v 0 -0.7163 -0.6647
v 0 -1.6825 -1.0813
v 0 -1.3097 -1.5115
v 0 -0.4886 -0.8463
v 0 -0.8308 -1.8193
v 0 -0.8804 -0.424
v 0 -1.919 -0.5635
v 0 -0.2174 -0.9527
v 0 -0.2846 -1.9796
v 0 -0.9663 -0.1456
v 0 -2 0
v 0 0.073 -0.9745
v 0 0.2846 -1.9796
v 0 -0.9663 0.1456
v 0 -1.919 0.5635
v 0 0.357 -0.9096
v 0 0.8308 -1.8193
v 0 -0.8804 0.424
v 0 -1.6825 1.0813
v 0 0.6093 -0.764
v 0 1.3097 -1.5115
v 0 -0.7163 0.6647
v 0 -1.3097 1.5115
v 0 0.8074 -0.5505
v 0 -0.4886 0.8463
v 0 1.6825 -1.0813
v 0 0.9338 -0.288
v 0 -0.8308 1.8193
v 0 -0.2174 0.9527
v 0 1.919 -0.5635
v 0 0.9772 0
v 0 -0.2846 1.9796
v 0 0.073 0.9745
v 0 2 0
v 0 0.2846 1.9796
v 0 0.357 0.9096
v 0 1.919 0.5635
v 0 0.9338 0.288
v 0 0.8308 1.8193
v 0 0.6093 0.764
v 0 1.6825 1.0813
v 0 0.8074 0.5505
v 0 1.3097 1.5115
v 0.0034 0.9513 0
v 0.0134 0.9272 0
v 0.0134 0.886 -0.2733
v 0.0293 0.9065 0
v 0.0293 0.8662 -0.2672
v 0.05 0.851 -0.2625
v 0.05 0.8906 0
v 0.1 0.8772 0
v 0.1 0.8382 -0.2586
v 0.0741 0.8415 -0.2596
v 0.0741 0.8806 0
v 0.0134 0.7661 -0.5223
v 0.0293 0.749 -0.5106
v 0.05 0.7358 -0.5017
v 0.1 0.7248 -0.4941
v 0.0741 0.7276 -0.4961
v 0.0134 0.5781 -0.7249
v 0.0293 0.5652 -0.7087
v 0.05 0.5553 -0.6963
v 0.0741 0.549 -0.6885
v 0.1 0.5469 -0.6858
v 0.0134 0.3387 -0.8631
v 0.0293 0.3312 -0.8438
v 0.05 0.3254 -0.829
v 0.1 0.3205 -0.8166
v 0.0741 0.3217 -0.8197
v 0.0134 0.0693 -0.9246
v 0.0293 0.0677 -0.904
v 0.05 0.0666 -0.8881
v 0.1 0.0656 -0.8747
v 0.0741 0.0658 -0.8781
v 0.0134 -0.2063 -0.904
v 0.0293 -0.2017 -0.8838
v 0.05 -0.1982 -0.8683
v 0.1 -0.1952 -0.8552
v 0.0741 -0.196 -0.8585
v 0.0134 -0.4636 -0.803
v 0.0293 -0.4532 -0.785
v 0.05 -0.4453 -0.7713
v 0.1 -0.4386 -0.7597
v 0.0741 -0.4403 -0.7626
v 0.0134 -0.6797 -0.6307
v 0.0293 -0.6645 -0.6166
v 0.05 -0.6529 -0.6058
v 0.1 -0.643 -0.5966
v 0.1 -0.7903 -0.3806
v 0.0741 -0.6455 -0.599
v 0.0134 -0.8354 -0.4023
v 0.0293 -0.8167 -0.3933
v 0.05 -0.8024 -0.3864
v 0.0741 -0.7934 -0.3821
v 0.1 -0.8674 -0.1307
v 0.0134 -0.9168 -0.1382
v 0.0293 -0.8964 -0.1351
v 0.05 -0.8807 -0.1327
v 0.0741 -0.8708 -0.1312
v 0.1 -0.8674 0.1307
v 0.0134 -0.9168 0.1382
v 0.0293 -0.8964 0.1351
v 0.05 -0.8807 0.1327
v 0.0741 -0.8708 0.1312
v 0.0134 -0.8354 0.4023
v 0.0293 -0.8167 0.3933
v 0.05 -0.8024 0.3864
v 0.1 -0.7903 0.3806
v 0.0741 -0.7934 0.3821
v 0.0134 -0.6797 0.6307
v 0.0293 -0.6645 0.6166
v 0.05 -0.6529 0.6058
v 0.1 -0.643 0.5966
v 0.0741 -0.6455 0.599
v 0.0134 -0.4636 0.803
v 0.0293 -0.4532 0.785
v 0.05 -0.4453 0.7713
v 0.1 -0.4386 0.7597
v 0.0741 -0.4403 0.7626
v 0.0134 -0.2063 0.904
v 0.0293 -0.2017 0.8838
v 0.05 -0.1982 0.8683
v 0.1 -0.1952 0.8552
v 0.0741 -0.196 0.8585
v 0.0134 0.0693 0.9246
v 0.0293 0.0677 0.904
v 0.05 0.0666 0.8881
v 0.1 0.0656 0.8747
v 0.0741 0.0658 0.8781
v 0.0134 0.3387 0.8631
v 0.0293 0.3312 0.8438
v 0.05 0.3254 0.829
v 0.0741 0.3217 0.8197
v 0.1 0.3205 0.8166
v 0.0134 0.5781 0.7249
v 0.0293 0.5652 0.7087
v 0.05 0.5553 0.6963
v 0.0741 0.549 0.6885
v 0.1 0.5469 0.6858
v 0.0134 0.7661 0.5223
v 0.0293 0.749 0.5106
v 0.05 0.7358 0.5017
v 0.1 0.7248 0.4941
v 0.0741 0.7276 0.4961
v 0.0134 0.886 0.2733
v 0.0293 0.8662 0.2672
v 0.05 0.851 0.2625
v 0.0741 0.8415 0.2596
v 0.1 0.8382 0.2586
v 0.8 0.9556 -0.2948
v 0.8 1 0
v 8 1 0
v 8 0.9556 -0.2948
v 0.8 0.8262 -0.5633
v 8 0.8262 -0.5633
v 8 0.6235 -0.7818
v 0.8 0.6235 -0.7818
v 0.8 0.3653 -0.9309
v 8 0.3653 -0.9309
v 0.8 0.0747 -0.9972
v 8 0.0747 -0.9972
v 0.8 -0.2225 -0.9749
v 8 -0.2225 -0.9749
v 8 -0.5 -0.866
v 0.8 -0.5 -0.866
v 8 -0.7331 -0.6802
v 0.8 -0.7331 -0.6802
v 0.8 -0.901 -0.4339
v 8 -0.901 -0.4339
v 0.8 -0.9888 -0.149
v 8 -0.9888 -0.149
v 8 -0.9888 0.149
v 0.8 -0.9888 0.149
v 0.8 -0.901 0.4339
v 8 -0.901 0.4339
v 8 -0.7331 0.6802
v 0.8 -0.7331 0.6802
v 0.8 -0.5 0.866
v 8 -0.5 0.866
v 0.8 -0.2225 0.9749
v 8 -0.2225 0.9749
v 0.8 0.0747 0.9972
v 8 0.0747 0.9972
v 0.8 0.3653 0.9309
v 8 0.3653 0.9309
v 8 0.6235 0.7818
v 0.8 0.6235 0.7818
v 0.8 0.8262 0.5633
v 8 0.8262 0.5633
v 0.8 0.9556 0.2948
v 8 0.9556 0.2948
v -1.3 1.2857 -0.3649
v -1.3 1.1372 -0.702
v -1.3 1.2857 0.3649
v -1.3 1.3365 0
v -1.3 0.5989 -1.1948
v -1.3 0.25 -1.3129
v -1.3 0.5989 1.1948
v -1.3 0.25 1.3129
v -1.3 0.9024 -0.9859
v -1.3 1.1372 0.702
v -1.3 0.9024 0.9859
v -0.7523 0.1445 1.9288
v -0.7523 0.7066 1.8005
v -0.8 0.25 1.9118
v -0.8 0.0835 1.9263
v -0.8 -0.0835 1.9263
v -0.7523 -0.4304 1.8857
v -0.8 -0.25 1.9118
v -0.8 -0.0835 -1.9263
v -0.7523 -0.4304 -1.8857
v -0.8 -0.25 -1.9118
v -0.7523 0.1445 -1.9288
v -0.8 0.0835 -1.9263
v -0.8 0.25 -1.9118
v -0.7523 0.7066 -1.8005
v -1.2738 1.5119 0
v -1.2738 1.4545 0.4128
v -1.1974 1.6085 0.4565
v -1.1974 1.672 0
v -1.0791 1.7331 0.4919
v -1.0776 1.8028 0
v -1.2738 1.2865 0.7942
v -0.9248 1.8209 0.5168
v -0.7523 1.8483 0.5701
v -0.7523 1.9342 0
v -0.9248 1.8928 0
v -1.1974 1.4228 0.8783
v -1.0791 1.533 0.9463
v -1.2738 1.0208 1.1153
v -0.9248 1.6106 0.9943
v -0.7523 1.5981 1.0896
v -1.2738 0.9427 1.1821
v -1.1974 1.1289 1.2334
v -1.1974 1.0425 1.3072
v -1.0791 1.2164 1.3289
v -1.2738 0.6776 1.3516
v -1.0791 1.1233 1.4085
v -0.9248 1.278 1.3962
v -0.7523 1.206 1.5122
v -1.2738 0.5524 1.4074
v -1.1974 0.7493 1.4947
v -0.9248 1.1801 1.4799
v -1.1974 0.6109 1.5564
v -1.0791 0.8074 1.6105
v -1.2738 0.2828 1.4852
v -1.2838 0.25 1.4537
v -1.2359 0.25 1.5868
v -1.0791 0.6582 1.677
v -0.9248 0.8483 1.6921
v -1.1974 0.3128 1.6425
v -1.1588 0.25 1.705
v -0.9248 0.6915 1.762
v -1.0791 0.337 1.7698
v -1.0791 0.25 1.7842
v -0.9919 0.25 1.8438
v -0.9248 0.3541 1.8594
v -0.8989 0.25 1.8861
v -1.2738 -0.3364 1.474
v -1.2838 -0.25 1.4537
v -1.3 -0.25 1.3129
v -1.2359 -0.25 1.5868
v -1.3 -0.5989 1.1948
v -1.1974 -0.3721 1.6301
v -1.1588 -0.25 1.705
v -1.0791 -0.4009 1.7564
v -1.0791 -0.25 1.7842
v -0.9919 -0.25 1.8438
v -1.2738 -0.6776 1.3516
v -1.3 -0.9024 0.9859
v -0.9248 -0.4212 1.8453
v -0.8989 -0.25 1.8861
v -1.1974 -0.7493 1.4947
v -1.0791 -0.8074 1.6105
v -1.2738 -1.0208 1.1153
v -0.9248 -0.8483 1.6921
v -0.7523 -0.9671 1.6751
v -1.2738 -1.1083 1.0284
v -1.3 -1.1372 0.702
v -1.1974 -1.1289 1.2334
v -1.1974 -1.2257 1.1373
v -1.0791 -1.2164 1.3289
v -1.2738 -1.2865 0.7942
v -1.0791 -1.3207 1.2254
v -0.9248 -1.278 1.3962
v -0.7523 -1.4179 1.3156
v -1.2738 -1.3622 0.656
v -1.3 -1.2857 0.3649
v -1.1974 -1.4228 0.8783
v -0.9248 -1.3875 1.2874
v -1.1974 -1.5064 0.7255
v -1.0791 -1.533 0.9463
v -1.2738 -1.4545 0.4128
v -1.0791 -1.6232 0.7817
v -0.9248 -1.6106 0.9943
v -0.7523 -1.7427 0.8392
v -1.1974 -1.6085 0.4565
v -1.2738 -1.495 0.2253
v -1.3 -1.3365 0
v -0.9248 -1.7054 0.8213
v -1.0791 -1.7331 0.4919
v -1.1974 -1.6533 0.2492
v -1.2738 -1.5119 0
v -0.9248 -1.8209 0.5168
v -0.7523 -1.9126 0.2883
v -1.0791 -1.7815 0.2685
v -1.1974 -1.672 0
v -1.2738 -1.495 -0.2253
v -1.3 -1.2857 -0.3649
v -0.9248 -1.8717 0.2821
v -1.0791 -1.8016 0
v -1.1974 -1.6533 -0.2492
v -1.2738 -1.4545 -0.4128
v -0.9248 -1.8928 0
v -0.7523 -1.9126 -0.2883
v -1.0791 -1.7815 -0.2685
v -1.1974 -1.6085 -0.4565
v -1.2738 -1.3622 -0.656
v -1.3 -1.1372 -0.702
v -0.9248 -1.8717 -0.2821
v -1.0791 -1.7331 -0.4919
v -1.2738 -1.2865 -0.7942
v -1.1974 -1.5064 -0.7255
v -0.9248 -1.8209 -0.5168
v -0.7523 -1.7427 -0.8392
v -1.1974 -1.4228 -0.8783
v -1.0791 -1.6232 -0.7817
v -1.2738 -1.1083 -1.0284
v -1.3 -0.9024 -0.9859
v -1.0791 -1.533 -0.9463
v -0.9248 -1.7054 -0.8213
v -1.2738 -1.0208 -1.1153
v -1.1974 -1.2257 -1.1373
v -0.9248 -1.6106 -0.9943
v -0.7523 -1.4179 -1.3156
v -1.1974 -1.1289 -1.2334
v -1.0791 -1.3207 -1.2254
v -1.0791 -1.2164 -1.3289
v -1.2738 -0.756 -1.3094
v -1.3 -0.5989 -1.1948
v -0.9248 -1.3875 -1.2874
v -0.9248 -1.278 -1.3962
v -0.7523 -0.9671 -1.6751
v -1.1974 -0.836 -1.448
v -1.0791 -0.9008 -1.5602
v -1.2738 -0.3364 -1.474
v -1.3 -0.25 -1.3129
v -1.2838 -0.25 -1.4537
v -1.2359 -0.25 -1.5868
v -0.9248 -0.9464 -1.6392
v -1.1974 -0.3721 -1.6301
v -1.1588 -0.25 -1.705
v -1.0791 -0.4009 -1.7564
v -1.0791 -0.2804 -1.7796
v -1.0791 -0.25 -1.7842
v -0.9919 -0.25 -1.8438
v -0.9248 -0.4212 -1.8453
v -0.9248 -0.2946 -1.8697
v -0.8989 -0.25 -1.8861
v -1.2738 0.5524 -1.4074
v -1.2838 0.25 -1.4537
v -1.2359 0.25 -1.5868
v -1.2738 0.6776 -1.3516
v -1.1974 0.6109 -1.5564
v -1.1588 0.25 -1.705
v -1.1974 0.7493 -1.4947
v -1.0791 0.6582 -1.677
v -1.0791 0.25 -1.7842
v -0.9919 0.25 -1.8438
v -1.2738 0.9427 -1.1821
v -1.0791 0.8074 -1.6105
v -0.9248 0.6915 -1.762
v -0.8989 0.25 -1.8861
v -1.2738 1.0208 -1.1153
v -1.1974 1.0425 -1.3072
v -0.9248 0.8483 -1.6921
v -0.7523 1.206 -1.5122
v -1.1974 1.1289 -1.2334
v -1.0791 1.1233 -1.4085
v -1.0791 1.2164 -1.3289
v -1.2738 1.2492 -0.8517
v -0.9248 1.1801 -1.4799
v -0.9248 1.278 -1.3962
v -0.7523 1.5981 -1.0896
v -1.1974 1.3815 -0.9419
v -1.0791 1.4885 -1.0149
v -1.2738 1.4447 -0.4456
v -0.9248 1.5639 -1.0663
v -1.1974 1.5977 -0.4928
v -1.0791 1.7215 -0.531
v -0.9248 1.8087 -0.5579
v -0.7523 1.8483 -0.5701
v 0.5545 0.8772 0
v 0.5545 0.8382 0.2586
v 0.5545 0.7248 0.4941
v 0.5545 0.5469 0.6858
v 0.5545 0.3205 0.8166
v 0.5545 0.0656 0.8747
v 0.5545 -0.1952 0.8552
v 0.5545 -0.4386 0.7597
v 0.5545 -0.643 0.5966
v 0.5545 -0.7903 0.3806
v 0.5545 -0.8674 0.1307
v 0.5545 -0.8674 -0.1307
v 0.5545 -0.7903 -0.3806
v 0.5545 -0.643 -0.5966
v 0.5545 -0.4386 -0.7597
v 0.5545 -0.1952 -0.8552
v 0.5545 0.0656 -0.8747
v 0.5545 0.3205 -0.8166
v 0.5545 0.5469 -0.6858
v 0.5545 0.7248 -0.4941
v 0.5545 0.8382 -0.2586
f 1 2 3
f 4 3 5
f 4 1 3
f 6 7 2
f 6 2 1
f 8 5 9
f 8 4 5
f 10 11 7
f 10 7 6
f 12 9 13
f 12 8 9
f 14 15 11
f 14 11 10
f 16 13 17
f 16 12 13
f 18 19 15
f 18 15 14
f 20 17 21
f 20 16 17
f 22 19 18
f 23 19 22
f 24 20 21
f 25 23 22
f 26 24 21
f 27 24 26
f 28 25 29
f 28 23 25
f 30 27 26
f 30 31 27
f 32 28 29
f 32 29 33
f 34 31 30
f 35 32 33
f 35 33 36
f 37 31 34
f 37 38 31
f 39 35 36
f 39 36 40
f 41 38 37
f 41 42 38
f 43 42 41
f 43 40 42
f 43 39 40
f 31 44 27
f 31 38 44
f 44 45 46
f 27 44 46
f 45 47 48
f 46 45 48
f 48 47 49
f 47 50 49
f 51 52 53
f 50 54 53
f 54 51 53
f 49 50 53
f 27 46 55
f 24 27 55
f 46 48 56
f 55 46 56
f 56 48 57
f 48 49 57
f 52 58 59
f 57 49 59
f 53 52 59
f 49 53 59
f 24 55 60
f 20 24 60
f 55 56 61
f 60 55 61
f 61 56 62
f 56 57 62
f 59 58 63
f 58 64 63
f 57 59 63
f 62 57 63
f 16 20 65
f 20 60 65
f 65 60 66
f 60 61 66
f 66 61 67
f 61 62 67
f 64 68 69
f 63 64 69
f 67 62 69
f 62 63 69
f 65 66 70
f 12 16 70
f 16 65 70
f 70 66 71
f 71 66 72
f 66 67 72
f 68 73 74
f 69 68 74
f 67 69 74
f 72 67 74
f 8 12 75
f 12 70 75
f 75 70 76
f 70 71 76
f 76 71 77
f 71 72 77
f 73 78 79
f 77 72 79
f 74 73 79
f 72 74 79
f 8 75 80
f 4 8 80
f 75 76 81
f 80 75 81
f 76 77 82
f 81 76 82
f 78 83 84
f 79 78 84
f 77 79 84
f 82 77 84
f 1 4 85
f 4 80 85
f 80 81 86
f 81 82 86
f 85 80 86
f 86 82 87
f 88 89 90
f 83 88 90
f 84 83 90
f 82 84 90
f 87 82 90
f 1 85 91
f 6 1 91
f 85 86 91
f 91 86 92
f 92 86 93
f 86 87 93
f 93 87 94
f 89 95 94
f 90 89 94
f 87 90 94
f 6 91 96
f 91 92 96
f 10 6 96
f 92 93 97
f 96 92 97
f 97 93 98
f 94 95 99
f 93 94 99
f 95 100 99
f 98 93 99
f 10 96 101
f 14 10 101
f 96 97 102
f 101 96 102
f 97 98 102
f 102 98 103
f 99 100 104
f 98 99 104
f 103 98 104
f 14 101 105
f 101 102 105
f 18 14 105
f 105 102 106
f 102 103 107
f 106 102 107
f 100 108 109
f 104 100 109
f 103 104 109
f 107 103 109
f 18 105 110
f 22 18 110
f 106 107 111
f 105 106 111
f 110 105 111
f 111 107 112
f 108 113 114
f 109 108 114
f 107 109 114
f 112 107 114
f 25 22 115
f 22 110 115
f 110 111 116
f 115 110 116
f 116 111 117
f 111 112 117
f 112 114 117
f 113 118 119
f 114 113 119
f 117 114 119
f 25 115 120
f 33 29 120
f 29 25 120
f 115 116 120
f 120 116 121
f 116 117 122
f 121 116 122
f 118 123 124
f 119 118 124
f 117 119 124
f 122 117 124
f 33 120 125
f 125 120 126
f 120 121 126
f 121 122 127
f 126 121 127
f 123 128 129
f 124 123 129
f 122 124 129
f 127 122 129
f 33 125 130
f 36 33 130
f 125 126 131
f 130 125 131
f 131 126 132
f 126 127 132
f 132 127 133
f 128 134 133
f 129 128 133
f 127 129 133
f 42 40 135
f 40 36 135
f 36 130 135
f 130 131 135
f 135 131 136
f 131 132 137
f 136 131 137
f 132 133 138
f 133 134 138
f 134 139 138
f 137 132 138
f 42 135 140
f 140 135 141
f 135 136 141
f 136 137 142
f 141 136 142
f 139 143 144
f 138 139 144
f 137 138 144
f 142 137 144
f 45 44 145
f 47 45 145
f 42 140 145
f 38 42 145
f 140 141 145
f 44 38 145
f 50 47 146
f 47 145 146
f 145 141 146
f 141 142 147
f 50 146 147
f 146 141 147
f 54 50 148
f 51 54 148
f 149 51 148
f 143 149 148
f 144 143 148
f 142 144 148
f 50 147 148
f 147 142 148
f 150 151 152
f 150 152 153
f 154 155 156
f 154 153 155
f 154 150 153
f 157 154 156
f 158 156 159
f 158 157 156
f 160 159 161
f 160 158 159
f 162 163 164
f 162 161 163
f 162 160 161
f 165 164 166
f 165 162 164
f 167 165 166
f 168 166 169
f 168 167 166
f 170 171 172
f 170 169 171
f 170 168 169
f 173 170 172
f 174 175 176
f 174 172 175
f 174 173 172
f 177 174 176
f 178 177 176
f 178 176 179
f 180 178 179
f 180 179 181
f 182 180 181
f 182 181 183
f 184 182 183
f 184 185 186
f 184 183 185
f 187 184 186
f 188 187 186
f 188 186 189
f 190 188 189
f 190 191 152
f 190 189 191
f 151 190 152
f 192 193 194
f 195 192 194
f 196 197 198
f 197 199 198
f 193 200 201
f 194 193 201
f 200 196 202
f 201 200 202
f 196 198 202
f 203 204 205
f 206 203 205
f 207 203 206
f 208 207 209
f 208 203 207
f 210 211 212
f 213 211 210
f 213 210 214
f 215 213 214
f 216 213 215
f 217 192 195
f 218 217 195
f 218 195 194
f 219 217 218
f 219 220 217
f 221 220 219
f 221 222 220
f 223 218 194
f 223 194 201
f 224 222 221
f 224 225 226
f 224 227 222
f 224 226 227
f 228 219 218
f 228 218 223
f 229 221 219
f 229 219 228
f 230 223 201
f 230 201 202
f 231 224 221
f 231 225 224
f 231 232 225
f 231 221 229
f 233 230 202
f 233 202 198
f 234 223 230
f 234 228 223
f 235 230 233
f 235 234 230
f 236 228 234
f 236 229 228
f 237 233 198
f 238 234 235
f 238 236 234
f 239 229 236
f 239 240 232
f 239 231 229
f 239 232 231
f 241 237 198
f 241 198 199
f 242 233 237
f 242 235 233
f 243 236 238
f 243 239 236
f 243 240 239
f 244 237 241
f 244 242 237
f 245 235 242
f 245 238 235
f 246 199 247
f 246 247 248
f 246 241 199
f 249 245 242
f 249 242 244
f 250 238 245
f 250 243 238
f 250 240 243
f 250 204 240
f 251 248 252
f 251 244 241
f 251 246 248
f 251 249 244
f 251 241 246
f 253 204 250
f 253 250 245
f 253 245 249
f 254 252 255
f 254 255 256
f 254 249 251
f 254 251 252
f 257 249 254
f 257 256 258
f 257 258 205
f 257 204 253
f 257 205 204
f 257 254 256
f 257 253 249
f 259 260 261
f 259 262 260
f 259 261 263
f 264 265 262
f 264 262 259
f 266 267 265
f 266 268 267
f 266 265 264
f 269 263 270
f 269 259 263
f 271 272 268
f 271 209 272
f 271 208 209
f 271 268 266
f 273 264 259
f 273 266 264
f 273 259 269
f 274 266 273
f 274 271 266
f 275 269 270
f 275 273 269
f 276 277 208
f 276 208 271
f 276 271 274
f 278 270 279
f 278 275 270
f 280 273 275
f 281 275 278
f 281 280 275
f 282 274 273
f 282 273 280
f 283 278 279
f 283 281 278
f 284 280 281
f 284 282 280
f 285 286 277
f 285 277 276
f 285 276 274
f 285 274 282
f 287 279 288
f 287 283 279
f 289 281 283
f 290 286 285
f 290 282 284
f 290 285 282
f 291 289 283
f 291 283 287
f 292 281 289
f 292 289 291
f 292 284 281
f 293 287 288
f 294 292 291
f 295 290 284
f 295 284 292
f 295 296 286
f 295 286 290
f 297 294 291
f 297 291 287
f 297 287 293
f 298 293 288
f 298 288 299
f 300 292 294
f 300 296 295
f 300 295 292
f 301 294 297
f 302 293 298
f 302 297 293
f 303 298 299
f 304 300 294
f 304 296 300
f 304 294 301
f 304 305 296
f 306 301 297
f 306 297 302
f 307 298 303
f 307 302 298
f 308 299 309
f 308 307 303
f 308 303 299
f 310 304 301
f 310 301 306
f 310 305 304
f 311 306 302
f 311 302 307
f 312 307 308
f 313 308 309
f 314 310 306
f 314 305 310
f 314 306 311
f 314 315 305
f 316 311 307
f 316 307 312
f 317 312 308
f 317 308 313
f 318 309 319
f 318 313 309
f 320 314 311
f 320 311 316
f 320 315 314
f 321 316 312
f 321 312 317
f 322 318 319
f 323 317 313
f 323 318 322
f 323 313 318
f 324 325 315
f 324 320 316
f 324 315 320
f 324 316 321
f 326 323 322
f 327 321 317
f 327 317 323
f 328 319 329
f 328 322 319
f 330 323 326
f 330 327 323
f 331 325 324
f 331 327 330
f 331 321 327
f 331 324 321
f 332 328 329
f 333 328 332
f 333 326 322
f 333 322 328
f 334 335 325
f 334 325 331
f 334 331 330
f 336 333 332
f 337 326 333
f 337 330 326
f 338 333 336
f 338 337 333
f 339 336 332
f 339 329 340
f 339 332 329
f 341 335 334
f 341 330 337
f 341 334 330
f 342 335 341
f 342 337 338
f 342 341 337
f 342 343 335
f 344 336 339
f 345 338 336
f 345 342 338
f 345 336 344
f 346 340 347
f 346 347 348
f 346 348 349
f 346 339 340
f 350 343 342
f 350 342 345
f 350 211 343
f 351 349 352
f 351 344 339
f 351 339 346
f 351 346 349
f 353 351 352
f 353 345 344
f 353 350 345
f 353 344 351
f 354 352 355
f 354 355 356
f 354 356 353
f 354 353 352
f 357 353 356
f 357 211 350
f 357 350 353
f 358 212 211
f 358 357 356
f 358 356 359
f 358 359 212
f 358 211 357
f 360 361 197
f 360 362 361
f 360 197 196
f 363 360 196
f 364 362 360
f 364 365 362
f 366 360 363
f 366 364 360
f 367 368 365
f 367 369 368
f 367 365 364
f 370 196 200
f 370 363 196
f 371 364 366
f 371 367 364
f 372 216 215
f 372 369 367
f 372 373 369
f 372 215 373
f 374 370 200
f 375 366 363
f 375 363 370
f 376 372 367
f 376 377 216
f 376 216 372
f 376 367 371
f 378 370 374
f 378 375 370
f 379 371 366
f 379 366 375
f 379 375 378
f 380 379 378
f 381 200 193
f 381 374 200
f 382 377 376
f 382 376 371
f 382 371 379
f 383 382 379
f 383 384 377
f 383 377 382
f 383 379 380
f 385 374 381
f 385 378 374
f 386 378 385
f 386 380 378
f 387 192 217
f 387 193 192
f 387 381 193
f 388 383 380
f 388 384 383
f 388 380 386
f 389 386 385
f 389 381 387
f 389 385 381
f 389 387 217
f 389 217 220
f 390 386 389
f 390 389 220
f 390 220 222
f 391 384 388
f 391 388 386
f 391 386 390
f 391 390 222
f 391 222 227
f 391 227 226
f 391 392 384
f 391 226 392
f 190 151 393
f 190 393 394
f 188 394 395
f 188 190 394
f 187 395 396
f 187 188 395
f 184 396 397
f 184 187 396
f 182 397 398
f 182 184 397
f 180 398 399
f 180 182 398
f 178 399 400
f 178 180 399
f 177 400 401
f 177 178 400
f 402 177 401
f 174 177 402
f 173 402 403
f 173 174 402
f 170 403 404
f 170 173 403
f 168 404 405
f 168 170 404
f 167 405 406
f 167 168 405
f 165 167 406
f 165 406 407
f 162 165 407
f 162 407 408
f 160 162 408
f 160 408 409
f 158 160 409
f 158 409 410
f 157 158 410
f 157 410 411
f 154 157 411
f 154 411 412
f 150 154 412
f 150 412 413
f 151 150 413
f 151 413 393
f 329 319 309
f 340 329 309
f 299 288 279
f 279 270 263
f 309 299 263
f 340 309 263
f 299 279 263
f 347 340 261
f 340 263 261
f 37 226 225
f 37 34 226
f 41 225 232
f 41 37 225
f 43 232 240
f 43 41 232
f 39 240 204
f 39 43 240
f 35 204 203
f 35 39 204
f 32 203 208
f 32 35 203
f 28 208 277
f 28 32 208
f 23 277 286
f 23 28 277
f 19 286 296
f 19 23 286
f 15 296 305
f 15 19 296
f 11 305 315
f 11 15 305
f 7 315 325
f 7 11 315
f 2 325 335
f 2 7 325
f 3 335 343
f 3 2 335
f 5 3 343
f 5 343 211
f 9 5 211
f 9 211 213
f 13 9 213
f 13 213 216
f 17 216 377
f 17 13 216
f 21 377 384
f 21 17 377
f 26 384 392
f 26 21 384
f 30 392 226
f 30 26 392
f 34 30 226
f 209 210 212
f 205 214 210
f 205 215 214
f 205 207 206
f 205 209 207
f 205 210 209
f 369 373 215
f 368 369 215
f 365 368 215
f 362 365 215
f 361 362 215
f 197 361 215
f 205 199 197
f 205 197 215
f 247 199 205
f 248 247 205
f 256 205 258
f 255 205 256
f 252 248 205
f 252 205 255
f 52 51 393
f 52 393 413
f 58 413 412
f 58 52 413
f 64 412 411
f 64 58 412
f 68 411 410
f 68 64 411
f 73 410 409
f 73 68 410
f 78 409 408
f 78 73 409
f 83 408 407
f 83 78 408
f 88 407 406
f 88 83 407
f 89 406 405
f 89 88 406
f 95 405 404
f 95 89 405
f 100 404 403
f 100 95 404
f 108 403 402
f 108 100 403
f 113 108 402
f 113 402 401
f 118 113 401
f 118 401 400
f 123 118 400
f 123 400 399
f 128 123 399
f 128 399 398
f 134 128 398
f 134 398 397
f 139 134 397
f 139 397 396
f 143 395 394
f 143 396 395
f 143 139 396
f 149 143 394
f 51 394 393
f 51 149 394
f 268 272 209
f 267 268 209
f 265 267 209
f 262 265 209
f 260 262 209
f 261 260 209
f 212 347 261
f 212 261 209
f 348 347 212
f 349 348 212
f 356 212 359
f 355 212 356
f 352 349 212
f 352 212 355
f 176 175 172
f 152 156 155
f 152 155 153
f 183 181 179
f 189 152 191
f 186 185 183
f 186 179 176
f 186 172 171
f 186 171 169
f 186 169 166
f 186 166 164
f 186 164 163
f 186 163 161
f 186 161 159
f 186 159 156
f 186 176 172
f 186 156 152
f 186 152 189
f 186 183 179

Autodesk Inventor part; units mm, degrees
ref_plane "YZ Plane" through (0, 0, 0) normal (1, 0, 0) x (0, 1, 0)
ref_plane "XZ Plane" through (0, 0, 0) normal (0, 1, 0) x (-1, 0, 0)
sketch "Эскиз1" plane through (0, 0, 0) normal (0, 0, 1) x (1, 0, 0)
  line L0 (-1.3, 0) -> (8, 0)
  line L1 (8, 0) -> (8, 1)
  line L2 (8, 1) -> (0.8, 1)
  line L3 (0.8, 1) -> (0.5545, 0.8772)
  line L4 (0.5545, 0.8772) -> (0, 0.8772)
  line L5 (0, 0.8772) -> (0, 2)
  line L6 (-3.16, 0) -> (9.86, 0) projected
  line L7 (0, -0.4) -> (0, 2.4) projected
  line L8 (-1.3, 0) -> (-1.3, 1.8863)
  line L9 (0, 2) -> (-1.3, 1.8863)
  line L10 (0.8, 1) -> (0, 1) construction
  dimension "d0" = 8
  dimension "d1" = 7.2
  dimension "d2" = 0.2455
  dimension "d3" = 1.3
  dimension "d4" = 2
  dimension "d5" = 1.7545
  dimension "d9" = 4
  dimension "d10" = 5
revolve "Базовый элемент" add sketch "Эскиз1" angle 360 about axis through (-1.3, 0, 0) along (1, 0, 0)
sketch "Эскиз2" plane through (-1.3, 0, 0) normal (-1, 0, 0) x (0, 0, 1)
  circle A0 centre (0, 0) radius 2 projected
  line L0 (0, 0) -> (0, 1.8863) projected
  line L1 (-2, 0.25) -> (2, 0.25)
  line L2 (2, 0.25) -> (2, -0.25)
  line L3 (2, -0.25) -> (-2, -0.25)
  line L4 (-2, -0.25) -> (-2, 0.25)
  line L5 (-2, 0) -> (2, 0) construction
  line L6 (0, 0.25) -> (0, -0.25) construction
  dimension "d11" = 0.5
  dimension "d12" = 4
fillet "Сопряжение1" radius 0.6 1 edges at (-1.3, -1.8863, 0)
extrude "Паз" cut sketch "Эскиз2" against normal blind 0.5 contours A0 L3 L1 | L2 L3 A0 | A0 L1 L2 | A0 L4 L1 | L3 L4 A0
thread "Резьба" size "M2x0.4" class "6g" standard "ISO Metric profile" length 7.2
ref_plane "Work Plane1" through (30.1625, 0, 0) normal (0, 0, -1) x (1, 0, 0)
fillet "Fillet5" radius 0.1 1 edges at (0, -0.8772, 0)
equation "\"d11\" = SBR"
equation "\"d12\" = KOD"
equation "\"d19\" = STI"
equation "\"d41\" = R"
equation "\"d14\" = RR"
equation "\"d15\" = GEL"
equation "\"d0\" = NLG"
equation "\"d1\" = GEL"
equation "\"d3\" = KOH"
equation "\"d4\" = GD"
equation "\"d5\" = BDM"
equation "\"d9\" = KOD"
equation "\"d10\" = KEWI"
equation "\"GD\" = NND"
equation "\"NLG\" = 8"
equation "\"GEL\" = 7.2"
equation "\"KOD\" = 4"
equation "\"KOH\" = 1.3"
equation "\"GAL\" = 0.61345 * PTC"
equation "\"R\" = 0.1"
equation "\"BDM\" = 1.7545"
equation "\"GUL\" = 0.61345 * PTC"
equation "\"RR\" = 0.6"
equation "\"SBR\" = 0.5"
equation "\"STI\" = 0.5"
equation "\"KEWI\" = 5deg"
equation "\"PTC\" = 0.4"
equation "\"THREADDIA\" = 2"
equation "\"TOA\" = 30deg"
equation "\"NND\" = 2"
equation "\"GD1\" = THREADDIA - 1.2269 * PTC"
properties part number "ISO 1580 - M2 x 8" material "Сталь, мягкая"
